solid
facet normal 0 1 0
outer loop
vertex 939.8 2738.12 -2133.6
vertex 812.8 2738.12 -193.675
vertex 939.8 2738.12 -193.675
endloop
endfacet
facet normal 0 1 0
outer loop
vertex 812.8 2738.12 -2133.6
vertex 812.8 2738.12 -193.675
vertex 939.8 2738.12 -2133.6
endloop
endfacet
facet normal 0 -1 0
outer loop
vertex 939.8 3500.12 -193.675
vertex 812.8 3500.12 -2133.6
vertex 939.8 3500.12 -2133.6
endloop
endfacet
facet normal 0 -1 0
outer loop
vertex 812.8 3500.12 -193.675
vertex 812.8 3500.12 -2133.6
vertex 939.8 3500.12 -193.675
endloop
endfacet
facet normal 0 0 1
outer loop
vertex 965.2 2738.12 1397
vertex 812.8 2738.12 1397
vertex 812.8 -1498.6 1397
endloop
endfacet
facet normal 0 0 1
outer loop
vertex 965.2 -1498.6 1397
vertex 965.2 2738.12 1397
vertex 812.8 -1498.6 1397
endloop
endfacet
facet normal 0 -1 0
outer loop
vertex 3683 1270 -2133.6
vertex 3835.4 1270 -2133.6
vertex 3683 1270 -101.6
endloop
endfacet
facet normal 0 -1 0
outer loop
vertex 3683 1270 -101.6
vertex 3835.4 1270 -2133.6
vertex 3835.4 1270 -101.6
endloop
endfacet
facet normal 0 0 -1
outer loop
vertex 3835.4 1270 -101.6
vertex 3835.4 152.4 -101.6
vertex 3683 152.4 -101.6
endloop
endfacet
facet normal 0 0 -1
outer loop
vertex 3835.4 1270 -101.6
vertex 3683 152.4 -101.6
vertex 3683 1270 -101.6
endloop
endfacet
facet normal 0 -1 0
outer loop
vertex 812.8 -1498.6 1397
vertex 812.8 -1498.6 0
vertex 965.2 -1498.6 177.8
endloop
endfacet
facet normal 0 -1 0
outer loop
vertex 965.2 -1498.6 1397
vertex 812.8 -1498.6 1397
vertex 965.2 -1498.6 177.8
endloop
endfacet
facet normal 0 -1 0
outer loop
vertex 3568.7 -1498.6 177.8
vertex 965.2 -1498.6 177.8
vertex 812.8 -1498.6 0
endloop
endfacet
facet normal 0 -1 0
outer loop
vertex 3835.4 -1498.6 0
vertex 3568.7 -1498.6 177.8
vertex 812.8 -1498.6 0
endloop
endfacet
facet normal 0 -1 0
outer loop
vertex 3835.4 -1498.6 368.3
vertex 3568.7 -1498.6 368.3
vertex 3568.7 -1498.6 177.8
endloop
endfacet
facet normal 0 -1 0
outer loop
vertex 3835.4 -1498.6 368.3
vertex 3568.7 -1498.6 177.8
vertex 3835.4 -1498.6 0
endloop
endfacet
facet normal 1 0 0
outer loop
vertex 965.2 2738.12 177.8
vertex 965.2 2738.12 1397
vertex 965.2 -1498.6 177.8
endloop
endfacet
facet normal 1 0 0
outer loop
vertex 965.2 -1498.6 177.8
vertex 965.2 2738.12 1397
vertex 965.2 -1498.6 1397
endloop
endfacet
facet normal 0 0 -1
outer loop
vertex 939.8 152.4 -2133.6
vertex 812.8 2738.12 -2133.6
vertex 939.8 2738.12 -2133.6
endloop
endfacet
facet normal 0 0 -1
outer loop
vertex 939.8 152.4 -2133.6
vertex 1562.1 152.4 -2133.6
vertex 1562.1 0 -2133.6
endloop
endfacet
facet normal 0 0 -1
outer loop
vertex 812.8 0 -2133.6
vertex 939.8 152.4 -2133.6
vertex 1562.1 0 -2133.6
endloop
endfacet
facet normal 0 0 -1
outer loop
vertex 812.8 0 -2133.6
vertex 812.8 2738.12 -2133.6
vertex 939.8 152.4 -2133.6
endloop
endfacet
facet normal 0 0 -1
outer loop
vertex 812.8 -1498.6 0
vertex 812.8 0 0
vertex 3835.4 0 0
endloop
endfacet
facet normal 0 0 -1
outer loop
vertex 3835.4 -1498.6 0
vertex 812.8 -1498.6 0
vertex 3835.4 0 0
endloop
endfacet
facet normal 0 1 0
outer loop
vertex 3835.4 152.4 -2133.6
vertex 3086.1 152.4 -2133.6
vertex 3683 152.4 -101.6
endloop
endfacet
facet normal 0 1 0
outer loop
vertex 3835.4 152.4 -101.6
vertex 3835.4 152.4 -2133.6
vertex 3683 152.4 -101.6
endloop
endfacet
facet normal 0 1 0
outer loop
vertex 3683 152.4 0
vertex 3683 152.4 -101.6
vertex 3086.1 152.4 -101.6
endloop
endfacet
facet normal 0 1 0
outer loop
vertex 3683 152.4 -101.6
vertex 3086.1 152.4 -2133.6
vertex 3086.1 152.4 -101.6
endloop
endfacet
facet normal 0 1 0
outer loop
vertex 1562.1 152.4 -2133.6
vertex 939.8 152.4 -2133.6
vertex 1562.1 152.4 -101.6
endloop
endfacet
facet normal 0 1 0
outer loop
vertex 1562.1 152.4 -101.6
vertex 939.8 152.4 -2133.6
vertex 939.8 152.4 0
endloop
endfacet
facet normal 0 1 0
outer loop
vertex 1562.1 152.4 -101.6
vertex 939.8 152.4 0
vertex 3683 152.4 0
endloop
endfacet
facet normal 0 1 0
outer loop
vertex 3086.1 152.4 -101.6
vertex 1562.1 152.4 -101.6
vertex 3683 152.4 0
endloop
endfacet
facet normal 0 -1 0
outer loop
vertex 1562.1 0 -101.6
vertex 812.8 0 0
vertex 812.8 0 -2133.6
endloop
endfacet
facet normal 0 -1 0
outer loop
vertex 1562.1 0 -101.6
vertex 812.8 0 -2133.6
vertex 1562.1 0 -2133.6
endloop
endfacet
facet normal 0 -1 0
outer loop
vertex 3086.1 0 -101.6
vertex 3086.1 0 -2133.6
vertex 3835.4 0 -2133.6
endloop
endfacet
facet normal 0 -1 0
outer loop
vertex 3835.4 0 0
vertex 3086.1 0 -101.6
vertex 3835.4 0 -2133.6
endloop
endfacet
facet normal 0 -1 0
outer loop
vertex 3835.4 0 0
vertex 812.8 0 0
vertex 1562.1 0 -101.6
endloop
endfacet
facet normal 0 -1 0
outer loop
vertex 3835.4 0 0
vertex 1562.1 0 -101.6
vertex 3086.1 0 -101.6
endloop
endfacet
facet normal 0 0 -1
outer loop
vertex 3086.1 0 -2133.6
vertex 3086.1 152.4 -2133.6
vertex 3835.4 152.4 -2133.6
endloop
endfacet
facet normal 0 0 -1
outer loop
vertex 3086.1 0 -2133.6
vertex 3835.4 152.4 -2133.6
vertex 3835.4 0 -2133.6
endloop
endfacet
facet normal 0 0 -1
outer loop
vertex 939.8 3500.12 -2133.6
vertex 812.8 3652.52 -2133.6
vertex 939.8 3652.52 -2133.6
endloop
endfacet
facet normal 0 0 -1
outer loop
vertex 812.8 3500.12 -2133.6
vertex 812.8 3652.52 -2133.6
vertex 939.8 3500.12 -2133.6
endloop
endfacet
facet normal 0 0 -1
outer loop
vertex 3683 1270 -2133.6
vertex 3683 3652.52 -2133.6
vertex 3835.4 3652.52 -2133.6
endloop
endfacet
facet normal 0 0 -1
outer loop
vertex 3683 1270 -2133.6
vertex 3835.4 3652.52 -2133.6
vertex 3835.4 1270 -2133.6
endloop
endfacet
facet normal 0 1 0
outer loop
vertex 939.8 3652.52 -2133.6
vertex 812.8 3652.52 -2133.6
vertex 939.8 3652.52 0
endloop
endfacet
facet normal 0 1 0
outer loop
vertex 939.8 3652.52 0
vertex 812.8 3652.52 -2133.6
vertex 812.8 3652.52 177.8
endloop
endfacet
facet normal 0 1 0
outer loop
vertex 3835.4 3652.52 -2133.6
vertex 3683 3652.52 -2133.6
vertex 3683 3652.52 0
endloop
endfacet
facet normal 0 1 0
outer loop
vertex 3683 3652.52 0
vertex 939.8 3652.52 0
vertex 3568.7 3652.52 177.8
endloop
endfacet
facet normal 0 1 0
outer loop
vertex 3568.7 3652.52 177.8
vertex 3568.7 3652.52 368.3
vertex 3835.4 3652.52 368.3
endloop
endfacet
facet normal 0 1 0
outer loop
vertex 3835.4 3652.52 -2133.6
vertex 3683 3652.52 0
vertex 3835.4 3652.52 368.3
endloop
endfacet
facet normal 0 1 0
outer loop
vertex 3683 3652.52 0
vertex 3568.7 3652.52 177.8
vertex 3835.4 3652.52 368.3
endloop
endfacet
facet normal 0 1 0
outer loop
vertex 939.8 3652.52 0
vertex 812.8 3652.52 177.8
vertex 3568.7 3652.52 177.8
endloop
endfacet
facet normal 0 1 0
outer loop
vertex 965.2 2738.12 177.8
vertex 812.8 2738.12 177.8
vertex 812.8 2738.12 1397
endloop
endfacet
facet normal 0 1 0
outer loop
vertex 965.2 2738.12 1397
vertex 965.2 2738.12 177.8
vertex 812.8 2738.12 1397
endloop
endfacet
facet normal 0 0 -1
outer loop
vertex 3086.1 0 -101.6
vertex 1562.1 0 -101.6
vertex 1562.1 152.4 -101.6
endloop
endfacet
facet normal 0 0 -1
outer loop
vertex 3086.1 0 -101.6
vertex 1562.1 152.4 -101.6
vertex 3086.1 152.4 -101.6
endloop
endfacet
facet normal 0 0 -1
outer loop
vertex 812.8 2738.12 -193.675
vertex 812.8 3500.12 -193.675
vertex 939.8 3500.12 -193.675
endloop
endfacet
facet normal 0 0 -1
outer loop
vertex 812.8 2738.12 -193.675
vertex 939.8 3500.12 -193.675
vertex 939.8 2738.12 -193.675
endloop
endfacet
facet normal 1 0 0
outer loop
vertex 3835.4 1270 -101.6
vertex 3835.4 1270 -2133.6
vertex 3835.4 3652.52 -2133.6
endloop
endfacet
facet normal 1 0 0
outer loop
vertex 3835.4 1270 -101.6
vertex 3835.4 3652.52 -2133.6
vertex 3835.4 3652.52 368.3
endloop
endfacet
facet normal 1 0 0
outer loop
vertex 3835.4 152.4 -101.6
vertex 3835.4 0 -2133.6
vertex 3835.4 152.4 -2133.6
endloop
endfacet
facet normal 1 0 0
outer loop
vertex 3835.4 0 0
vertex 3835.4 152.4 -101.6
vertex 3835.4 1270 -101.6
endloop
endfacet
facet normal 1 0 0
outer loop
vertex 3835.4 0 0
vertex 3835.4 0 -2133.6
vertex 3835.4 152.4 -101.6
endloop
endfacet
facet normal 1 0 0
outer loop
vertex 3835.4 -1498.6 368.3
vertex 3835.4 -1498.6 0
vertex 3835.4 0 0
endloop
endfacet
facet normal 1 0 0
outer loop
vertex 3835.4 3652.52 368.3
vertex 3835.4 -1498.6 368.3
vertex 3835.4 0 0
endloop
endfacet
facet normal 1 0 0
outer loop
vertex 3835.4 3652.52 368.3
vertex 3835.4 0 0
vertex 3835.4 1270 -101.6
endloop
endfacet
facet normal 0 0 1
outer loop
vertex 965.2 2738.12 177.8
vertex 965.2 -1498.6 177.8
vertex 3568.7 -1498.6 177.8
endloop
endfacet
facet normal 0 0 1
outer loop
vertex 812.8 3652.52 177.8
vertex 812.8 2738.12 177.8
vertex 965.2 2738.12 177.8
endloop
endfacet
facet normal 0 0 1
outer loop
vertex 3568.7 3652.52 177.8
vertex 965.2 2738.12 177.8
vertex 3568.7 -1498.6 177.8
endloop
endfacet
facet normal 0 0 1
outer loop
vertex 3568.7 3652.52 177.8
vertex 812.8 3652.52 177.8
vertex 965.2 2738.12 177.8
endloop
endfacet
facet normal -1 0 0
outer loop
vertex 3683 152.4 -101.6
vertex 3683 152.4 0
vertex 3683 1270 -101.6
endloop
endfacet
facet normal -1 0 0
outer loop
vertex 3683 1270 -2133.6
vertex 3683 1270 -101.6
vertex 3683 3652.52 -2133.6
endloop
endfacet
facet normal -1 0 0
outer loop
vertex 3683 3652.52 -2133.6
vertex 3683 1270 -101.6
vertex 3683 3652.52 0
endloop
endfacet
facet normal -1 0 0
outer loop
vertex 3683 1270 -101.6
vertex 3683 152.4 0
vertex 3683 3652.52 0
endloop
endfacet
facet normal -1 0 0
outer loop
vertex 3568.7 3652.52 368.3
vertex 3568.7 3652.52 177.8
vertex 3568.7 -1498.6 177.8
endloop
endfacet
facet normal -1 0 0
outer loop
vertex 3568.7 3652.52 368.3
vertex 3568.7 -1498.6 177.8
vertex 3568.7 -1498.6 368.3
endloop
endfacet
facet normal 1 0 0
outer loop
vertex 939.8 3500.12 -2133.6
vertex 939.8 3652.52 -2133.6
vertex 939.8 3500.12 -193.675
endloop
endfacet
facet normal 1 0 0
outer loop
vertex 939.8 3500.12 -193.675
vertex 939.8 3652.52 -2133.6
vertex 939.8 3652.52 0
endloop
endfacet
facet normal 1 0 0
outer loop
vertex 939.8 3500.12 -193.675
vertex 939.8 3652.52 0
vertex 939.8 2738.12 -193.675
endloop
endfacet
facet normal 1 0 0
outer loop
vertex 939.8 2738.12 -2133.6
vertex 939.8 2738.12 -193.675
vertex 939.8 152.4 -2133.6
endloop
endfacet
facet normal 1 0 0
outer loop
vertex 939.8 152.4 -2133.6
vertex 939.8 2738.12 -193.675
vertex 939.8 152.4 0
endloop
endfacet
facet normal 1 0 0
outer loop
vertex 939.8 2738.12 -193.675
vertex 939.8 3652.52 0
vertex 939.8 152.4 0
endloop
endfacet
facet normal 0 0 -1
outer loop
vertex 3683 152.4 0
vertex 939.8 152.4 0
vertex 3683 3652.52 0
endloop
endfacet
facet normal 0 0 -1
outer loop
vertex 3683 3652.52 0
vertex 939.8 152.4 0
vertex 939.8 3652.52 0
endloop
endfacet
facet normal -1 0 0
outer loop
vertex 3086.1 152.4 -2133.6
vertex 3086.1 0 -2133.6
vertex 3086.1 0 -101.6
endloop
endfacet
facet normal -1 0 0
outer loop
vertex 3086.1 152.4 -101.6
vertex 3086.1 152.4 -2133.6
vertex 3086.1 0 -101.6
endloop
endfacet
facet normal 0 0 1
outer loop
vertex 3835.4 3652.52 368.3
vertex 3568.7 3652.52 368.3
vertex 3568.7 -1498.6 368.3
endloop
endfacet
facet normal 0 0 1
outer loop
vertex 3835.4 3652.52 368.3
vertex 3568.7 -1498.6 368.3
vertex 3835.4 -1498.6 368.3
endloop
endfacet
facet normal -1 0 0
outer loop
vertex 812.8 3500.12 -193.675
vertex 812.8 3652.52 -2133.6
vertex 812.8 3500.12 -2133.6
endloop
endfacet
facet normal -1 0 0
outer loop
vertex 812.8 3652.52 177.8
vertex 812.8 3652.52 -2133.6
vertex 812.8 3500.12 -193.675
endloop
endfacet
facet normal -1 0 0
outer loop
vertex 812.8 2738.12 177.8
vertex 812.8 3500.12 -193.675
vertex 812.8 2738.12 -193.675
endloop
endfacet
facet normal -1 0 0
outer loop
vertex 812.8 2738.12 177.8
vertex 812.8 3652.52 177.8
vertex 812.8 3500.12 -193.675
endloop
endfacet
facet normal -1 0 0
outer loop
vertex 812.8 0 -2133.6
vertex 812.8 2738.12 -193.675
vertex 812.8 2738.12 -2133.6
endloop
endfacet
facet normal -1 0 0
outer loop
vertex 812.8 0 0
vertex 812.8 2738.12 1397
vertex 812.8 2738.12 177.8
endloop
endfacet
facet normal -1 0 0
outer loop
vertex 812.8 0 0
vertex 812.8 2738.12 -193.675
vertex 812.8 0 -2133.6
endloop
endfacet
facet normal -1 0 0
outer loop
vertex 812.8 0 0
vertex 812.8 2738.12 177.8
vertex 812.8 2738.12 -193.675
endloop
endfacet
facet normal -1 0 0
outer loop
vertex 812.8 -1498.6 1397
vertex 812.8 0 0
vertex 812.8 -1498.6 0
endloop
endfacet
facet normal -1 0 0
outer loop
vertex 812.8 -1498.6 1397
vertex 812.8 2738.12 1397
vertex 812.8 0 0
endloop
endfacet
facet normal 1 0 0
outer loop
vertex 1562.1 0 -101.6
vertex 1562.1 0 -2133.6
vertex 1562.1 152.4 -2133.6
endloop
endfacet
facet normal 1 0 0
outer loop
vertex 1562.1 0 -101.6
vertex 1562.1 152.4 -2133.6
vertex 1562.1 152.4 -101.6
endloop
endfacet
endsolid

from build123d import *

# Parameters (mm, degrees)
F0_W      = 3835.4
F0_H      = 3652.52
F0_W_2    = 3530.6
F0_H_2    = 3347.72
F1_DEPTH  = 2133.6
F2_W      = 3835.4
F2_H      = 177.8
F3_DEPTH  = 3652.52
F4_W      = 3347.72
F4_H      = 2133.6
F5_DEPTH  = 152.4
F6_W      = 3835.4
F6_H      = 5151.12
F7_DEPTH  = 177.8
F9_DEPTH  = 812.8
F10_W     = 3500.12
F10_H     = 2311.4
F11_DEPTH = 127
F12_W     = 1524
F12_H     = 2032
F13_DEPTH = 152.4
F14_W     = 1117.6
F14_H     = 2032
F15_DEPTH = 152.4
F16_W     = 2743.2
F16_H     = 2133.6
F17_DEPTH = 152.4
F18_W     = 812.8
F18_H     = 2311.4
F19_DEPTH = 152.4
F20_W     = 4236.72
F20_H     = 1219.2
F21_DEPTH = 152.4
F23_DEPTH = 152.4
F25_DEPTH = 127
F26_W     = 266.7
F26_H     = 190.5
F27_DEPTH = 5151.12


with BuildPart() as f1:
    # F0 (on Top) → F1 (new body)
    with BuildSketch(Plane.XY):
        with Locations((1917.7, 1826.26)):
            Rectangle(F0_W, F0_H)
        with Locations((1917.7, 1826.26)):
            Rectangle(F0_W_2, F0_H_2, mode=Mode.SUBTRACT)
    extrude(amount=-F1_DEPTH)

    # F2 (on face) → F3 (join, through all)
    with BuildSketch(Plane.XZ):
        with Locations((1917.7, 88.9)):
            Rectangle(F2_W, F2_H)
    extrude(amount=-F3_DEPTH)

    # F4 (on face) → F5 (cut, through all)
    with BuildSketch(Plane(origin=(0, 0, 0), x_dir=(0, -1, 0), z_dir=(-1, 0, 0))):
        with Locations((-1826.26, -1066.8)):
            Rectangle(F4_W, F4_H)
    extrude(amount=-F5_DEPTH, mode=Mode.SUBTRACT)

    # F6 (on face) → F7 (join, through all)
    with BuildSketch(Plane.XY.offset(177.8)):
        with Locations((1917.7, 1076.96)):
            Rectangle(F6_W, F6_H)
    extrude(amount=-F7_DEPTH)

    # F8 (on face) → F9 (cut)
    with BuildSketch(Plane(origin=(0, 0, 0), x_dir=(0, -1, 0), z_dir=(-1, 0, 0))):
        Polygon((-3500.12, 177.8), (-3500.12, -2133.6), (0, -2133.6), (1498.6, -2133.6), (1498.6, 177.8), align=None)
        Polygon((-3500.12, 0), (-3500.12, -2133.6), (0, -2133.6), (1498.6, -2133.6), (1498.6, 177.8), (-3500.12, 177.8), align=None)
    extrude(amount=-F9_DEPTH, mode=Mode.SUBTRACT)

    # F10 (on face) → F11 (join)
    with BuildSketch(Plane(origin=(812.8, 0, 0), x_dir=(0, -1, 0), z_dir=(-1, 0, 0))):
        with Locations((-1750.06, -977.9)):
            Rectangle(F10_W, F10_H)
    extrude(amount=-F11_DEPTH)

    # F12 (on face) → F13 (cut, through all)
    with BuildSketch(Plane.XZ):
        with Locations((2324.1, -1117.6)):
            Rectangle(F12_W, F12_H)
    extrude(amount=-F13_DEPTH, mode=Mode.SUBTRACT)

    # F14 (on face) → F15 (cut, through all)
    with BuildSketch(Plane.YZ.offset(3835.4)):
        with Locations((711.2, -1117.6)):
            Rectangle(F14_W, F14_H)
    extrude(amount=-F15_DEPTH, mode=Mode.SUBTRACT)

    # F16 (on face) → F17 (cut, through all)
    with BuildSketch(Plane.XZ.offset(-3500.12)):
        with Locations((2311.4, -1066.8)):
            Rectangle(F16_W, F16_H)
    extrude(amount=-F17_DEPTH, mode=Mode.SUBTRACT)

    # F18 (on face) → F19 (cut, through all)
    with BuildSketch(Plane.XZ.offset(-3500.12)):
        with Locations((406.4, -977.9)):
            Rectangle(F18_W, F18_H)
    extrude(amount=-F19_DEPTH, mode=Mode.SUBTRACT)

    # F20 (on face) → F21 (join)
    with BuildSketch(Plane(origin=(812.8, 0, 0), x_dir=(0, -1, 0), z_dir=(-1, 0, 0))):
        with Locations((-619.76, 787.4)):
            Rectangle(F20_W, F20_H)
    extrude(amount=-F21_DEPTH)

    # F22 (on face) → F23 (cut)
    with BuildSketch(Plane(origin=(812.8, 0, 0), x_dir=(0, -1, 0), z_dir=(-1, 0, 0))):
        Polygon((-3652.52, -2133.6), (-203.2, -2133.6), (-2738.12, 0), (-3652.52, 0), align=None)
    extrude(amount=-F23_DEPTH, mode=Mode.SUBTRACT)

    # F24 (on face) → F25 (join, through all)
    with BuildSketch(Plane(origin=(812.8, 0, 0), x_dir=(0, -1, 0), z_dir=(-1, 0, 0))):
        Polygon((-3500.12, 0), (-3652.52, 0), (-3652.52, -2133.6), (-3500.12, -2133.6), (-3500.12, -193.675), (-2738.12, -193.675), (-2738.12, -2133.6), (-203.2, -2133.6), (-2738.12, 0), align=None)
    extrude(amount=-F25_DEPTH)

    # F26 (on face) → F27 (join, through all)
    with BuildSketch(Plane.XZ.offset(1498.6)):
        with Locations((3702.05, 273.05)):
            Rectangle(F26_W, F26_H)
    extrude(amount=-F27_DEPTH)


solid = f1.part
